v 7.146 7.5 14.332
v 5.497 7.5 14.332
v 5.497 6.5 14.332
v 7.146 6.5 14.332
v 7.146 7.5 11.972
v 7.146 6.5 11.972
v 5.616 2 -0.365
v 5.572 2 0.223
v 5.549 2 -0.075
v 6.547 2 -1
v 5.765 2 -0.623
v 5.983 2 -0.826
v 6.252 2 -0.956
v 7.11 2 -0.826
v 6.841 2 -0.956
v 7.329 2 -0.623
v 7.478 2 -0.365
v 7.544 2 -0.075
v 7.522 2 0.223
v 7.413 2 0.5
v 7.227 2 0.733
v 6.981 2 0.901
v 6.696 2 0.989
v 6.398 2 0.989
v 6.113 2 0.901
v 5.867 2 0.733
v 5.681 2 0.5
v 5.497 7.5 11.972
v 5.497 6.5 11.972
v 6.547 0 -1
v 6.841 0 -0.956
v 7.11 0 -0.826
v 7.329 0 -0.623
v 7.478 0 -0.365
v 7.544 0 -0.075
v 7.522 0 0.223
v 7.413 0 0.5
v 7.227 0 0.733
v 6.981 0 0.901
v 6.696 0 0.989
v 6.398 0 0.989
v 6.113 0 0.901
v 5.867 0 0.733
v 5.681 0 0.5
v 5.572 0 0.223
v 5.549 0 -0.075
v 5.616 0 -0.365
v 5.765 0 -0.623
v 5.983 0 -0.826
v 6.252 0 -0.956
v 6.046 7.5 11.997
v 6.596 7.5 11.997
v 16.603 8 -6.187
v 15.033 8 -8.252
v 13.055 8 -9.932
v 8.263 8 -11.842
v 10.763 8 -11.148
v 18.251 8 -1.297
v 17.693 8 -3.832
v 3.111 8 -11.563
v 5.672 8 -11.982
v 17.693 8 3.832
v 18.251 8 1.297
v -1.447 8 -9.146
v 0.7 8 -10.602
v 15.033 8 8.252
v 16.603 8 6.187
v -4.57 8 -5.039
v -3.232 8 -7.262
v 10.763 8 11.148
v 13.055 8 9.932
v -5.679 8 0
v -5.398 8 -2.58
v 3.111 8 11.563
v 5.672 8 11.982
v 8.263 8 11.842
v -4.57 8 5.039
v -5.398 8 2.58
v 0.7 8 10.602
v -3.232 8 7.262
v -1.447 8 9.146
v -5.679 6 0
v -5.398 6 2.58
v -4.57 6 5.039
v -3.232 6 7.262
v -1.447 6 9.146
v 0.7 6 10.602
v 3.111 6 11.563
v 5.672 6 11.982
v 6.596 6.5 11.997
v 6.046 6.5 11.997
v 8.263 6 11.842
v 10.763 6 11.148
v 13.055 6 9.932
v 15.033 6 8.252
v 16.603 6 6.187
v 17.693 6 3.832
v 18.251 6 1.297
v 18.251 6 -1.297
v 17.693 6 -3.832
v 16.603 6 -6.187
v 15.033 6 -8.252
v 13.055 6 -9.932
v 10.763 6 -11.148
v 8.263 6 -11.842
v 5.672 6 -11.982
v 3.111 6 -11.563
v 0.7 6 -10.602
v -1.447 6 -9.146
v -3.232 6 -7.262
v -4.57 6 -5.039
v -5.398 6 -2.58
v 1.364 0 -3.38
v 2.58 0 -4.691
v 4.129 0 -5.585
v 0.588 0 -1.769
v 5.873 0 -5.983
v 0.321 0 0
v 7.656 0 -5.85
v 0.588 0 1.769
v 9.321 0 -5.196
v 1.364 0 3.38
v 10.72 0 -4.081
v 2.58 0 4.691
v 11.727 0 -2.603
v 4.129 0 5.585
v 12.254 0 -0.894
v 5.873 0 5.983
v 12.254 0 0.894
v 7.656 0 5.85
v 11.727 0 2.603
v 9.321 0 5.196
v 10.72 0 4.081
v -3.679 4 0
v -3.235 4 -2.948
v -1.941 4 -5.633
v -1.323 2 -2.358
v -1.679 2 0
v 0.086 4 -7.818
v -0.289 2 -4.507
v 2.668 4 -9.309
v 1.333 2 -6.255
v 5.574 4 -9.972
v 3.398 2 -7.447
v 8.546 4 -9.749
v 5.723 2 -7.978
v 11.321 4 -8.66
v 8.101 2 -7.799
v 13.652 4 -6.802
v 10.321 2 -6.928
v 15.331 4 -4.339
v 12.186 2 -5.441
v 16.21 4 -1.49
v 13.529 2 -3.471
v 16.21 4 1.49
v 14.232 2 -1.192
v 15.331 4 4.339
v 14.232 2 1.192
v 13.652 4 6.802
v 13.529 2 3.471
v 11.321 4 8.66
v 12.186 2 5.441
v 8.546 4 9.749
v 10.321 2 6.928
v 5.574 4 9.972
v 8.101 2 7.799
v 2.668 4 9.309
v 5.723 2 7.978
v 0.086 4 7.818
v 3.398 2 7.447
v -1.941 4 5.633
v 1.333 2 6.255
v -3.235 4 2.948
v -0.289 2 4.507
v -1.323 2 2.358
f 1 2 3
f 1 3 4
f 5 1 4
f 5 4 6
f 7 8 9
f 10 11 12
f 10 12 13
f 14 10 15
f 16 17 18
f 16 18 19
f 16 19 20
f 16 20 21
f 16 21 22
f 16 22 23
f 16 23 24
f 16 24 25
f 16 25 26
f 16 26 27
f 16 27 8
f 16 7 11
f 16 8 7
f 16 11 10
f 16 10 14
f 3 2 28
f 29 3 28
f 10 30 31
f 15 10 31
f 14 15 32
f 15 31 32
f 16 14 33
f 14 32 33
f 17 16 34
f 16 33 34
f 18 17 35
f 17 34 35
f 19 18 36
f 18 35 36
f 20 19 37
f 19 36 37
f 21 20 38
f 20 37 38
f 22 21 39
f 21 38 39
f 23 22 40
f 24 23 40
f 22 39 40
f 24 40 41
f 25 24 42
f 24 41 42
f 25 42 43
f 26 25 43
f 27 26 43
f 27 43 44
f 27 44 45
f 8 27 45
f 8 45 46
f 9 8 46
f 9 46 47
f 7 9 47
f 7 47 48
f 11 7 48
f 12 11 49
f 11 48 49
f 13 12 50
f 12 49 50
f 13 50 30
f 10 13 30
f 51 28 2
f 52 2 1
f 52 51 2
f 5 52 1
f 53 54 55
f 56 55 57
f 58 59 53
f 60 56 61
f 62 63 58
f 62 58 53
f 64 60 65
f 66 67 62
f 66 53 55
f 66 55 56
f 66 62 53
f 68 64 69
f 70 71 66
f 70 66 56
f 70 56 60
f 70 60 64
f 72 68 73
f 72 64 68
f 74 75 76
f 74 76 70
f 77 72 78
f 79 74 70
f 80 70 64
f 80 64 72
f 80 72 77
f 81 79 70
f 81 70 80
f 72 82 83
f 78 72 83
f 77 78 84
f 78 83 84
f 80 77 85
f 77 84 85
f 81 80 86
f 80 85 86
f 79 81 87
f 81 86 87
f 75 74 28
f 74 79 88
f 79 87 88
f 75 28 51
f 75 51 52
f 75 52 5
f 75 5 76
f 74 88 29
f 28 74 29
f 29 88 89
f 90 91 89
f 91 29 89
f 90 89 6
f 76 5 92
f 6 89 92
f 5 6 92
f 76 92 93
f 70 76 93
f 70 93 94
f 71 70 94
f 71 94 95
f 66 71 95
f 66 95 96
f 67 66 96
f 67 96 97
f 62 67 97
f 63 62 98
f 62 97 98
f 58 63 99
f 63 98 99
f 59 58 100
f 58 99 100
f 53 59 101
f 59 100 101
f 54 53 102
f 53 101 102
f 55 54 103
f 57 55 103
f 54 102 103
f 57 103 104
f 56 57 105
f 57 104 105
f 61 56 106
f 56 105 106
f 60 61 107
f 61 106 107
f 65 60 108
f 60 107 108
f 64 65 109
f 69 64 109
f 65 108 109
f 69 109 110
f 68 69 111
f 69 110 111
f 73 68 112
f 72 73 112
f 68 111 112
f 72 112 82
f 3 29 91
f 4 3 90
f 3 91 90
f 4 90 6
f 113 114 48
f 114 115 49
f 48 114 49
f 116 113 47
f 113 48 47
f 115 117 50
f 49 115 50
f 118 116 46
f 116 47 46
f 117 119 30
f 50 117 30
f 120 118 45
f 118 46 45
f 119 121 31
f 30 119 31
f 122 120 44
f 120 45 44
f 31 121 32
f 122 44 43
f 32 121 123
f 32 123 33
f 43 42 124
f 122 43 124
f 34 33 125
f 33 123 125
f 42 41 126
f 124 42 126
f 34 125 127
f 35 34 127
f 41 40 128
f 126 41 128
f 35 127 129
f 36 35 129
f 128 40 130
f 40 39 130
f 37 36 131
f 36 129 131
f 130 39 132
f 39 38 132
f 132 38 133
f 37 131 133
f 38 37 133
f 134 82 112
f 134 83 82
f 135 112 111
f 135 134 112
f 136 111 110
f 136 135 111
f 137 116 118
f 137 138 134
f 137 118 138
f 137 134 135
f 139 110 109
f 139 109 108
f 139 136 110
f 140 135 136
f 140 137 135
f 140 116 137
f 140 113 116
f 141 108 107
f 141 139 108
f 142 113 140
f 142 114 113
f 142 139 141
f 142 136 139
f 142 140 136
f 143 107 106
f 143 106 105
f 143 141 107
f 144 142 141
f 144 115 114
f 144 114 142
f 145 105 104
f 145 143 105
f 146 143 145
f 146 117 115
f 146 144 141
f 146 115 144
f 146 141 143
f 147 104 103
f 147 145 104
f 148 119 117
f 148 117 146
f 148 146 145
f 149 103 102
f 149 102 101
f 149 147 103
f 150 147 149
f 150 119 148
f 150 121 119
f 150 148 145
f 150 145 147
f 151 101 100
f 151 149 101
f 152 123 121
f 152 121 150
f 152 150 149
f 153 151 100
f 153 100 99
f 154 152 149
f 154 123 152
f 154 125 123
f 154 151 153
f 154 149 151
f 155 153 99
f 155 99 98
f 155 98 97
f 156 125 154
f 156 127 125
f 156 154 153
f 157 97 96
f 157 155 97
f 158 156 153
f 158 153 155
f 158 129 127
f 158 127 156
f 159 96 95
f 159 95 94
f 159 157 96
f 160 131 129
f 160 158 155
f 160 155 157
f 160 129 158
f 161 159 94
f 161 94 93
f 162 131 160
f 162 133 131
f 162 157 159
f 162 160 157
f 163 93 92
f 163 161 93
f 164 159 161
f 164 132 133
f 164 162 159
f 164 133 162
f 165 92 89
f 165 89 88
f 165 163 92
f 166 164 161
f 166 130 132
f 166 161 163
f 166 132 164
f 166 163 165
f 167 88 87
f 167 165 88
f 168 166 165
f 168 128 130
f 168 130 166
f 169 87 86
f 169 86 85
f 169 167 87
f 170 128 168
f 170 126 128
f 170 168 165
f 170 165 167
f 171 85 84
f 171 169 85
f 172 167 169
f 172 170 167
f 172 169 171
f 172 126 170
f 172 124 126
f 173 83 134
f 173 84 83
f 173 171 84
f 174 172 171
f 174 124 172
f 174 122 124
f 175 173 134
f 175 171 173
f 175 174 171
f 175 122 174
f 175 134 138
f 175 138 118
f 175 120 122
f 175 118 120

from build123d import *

# Parameters (mm, degrees)
SKETCH11_R          = 12
BOSS_EXTRUDE3_DEPTH = 2
BOSS_EXTRUDE4_START = -0.5
SKETCH12_W          = 1.649249379
SKETCH12_H          = 3.276759918
BOSS_EXTRUDE4_DEPTH = 1
SKETCH14_R          = 1
CUT_EXTRUDE2_DEPTH  = 2


with BuildPart() as part:
    # Sketch1 → Revolve1 (revolve)
    with BuildSketch(Plane.XY):
        Polygon((0.388993331, -0.067795133), (-5.226777212, -4), (6.321198199, -4), (6.321198199, 6), (-5.678801801, 6), align=None)
    revolve(axis=Axis((6.321198199, 11.047707555, 0), (0, -1, 0)))


with BuildPart() as body_2:
    # Split2: the piece on the far side of the plane
    add(part.part)
    split(bisect_by=Plane.ZX, keep=Keep.BOTTOM)


with BuildPart() as part_1:
    add(part.part)

    # Split2
    split(bisect_by=Plane.ZX, keep=Keep.TOP)

    # Sketch11 → Boss-Extrude3 (add)
    with BuildSketch(Plane(origin=(0, 6, 0), x_dir=(1, 0, 0), z_dir=(0, 1, 0))):
        with Locations(Location((6.321198199, 0, 0), (0, 0, 180))):
            Circle(SKETCH11_R)
    extrude(amount=BOSS_EXTRUDE3_DEPTH)

    # Sketch12 → Boss-Extrude4 (add)
    with BuildSketch(Plane(origin=(0, 8, 0), x_dir=(1, 0, 0), z_dir=(0, 1, 0)).offset(BOSS_EXTRUDE4_START)):
        with Locations((6.321198199, -12.693940914)):
            Rectangle(SKETCH12_W, SKETCH12_H)
    extrude(amount=-BOSS_EXTRUDE4_DEPTH)

    # Sketch14 → Cut-Extrude2 (cut)
    with BuildSketch(Plane(origin=(0, 0, 0), x_dir=(-1, 0, 0), z_dir=(0, -1, 0))):
        with Locations(Location((-6.546676473, 0, 0), (0, 0, 90))):
            Circle(SKETCH14_R)
    extrude(amount=-CUT_EXTRUDE2_DEPTH, mode=Mode.SUBTRACT)


solid = part_1.part
